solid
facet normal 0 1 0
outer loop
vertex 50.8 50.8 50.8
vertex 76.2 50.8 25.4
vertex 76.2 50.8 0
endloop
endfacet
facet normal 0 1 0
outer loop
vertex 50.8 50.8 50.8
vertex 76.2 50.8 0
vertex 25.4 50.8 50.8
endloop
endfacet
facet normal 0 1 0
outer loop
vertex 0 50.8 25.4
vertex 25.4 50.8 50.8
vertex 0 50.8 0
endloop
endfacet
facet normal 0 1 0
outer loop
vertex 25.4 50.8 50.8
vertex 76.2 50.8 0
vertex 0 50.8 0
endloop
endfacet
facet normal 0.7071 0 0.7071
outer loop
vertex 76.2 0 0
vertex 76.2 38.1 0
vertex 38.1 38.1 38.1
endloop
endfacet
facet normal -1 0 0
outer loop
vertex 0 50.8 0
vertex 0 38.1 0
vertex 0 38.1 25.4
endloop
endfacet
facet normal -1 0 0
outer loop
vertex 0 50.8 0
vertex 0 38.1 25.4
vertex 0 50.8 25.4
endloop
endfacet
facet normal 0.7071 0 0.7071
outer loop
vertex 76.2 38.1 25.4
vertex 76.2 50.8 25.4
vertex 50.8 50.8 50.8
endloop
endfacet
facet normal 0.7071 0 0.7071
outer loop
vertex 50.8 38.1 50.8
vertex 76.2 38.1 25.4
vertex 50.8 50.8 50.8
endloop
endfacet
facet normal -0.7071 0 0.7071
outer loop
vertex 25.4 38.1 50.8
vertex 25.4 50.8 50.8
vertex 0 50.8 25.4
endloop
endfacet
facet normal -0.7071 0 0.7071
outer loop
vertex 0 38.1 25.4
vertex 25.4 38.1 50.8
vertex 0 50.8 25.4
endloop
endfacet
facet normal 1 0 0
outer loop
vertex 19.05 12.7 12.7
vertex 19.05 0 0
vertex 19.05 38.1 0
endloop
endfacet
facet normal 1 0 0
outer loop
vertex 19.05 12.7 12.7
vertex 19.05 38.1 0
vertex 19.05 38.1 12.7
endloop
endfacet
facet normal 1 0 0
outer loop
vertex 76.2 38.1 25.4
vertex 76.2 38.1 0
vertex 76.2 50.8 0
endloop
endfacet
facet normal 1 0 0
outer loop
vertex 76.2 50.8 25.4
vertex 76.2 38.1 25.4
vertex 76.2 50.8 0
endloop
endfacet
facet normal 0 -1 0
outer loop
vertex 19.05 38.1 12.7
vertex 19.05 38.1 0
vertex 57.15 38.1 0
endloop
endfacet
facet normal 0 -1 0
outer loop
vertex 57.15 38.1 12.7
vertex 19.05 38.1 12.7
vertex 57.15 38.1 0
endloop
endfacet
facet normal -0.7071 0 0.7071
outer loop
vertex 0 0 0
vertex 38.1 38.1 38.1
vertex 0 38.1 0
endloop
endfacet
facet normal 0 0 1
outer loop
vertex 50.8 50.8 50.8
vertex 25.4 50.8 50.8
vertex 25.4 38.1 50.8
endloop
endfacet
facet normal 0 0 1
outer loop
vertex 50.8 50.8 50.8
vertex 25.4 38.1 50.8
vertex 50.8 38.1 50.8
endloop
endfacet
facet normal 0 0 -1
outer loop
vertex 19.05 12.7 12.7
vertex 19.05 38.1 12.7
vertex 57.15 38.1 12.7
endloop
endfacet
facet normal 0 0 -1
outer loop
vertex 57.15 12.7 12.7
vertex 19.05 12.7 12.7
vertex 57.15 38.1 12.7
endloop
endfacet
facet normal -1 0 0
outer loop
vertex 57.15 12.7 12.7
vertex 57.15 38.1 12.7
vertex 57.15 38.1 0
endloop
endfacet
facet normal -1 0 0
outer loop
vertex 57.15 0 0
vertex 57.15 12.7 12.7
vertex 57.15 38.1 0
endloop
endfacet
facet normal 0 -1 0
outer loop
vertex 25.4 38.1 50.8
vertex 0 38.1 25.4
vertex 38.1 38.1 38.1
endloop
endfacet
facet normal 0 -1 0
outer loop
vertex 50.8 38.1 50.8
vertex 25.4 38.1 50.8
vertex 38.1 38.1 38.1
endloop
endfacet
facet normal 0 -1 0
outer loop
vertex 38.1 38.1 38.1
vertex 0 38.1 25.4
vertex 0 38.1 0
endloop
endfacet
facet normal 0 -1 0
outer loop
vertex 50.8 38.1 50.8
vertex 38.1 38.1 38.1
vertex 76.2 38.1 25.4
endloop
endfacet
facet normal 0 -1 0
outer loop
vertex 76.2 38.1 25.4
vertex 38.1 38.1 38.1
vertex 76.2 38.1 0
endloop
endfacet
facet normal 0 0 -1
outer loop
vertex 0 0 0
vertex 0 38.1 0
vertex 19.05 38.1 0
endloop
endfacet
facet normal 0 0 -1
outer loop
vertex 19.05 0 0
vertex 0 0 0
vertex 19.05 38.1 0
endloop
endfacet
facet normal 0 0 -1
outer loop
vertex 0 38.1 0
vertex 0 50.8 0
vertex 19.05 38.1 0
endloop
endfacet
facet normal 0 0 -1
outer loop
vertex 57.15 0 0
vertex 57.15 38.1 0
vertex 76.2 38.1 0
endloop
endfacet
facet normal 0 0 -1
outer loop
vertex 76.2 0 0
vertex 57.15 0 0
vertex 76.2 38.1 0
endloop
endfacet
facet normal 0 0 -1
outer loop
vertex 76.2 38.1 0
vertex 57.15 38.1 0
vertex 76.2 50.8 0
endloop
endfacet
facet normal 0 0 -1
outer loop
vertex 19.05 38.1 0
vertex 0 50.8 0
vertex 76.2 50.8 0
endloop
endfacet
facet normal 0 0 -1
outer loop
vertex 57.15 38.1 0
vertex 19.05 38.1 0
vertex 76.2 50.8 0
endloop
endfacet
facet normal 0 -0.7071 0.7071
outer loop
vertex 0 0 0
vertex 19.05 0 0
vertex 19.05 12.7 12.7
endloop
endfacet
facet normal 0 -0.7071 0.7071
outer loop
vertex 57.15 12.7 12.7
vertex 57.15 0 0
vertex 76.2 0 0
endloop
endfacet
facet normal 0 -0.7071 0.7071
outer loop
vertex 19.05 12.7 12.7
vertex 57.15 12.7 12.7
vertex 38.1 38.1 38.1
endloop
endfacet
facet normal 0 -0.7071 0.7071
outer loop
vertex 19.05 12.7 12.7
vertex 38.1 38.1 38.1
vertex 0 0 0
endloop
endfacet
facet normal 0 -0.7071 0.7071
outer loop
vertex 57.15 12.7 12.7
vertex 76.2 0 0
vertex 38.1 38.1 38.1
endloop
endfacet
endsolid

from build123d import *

# Parameters (mm, degrees)
F0_W     = 25.4
F0_H     = 12.7
F1_DEPTH = 50.8
F3_DEPTH = 12.7
F5_DEPTH = 38.1
F7_DEPTH = 76.201


with BuildPart() as f1:
    # F0 (on Top) → F1 (new body)
    with BuildSketch(Plane.XY):
        with Locations((12.7, 44.45)):
            Rectangle(F0_W, F0_H)
        Polygon((25.4, 38.1), (38.1, 38.1), (50.8, 38.1), (50.8, 50.8), (25.4, 50.8), align=None)
        with Locations((63.5, 44.45)):
            Rectangle(F0_W, F0_H)
    extrude(amount=F1_DEPTH)

    # F2 (on face) → F3 (cut)
    with BuildSketch(Plane(origin=(0, 50.8, 0), x_dir=(-1, 0, 0), z_dir=(0, 1, 0))):
        Polygon((-76.2, 25.4), (-50.8, 50.8), (-76.2, 50.8), align=None)
        Polygon((-25.4, 50.8), (0, 25.4), (0, 50.8), align=None)
    extrude(amount=-F3_DEPTH, mode=Mode.SUBTRACT)

    # F4 (on face) → F5 (join)
    with BuildSketch(Plane.XZ.offset(-38.1)):
        Polygon((38.1, 38.1), (0, 0), (19.05, 0), (19.05, 12.7), (57.15, 12.7), (57.15, 0), (76.2, 0), align=None)
    extrude(amount=F5_DEPTH)

    # F6 (on face) → F7 (cut, through all)
    with BuildSketch(Plane.YZ.offset(76.2)):
        Polygon((38.1, 38.1), (0, 38.1), (0, 0), align=None)
    extrude(amount=-F7_DEPTH, mode=Mode.SUBTRACT)


solid = f1.part
